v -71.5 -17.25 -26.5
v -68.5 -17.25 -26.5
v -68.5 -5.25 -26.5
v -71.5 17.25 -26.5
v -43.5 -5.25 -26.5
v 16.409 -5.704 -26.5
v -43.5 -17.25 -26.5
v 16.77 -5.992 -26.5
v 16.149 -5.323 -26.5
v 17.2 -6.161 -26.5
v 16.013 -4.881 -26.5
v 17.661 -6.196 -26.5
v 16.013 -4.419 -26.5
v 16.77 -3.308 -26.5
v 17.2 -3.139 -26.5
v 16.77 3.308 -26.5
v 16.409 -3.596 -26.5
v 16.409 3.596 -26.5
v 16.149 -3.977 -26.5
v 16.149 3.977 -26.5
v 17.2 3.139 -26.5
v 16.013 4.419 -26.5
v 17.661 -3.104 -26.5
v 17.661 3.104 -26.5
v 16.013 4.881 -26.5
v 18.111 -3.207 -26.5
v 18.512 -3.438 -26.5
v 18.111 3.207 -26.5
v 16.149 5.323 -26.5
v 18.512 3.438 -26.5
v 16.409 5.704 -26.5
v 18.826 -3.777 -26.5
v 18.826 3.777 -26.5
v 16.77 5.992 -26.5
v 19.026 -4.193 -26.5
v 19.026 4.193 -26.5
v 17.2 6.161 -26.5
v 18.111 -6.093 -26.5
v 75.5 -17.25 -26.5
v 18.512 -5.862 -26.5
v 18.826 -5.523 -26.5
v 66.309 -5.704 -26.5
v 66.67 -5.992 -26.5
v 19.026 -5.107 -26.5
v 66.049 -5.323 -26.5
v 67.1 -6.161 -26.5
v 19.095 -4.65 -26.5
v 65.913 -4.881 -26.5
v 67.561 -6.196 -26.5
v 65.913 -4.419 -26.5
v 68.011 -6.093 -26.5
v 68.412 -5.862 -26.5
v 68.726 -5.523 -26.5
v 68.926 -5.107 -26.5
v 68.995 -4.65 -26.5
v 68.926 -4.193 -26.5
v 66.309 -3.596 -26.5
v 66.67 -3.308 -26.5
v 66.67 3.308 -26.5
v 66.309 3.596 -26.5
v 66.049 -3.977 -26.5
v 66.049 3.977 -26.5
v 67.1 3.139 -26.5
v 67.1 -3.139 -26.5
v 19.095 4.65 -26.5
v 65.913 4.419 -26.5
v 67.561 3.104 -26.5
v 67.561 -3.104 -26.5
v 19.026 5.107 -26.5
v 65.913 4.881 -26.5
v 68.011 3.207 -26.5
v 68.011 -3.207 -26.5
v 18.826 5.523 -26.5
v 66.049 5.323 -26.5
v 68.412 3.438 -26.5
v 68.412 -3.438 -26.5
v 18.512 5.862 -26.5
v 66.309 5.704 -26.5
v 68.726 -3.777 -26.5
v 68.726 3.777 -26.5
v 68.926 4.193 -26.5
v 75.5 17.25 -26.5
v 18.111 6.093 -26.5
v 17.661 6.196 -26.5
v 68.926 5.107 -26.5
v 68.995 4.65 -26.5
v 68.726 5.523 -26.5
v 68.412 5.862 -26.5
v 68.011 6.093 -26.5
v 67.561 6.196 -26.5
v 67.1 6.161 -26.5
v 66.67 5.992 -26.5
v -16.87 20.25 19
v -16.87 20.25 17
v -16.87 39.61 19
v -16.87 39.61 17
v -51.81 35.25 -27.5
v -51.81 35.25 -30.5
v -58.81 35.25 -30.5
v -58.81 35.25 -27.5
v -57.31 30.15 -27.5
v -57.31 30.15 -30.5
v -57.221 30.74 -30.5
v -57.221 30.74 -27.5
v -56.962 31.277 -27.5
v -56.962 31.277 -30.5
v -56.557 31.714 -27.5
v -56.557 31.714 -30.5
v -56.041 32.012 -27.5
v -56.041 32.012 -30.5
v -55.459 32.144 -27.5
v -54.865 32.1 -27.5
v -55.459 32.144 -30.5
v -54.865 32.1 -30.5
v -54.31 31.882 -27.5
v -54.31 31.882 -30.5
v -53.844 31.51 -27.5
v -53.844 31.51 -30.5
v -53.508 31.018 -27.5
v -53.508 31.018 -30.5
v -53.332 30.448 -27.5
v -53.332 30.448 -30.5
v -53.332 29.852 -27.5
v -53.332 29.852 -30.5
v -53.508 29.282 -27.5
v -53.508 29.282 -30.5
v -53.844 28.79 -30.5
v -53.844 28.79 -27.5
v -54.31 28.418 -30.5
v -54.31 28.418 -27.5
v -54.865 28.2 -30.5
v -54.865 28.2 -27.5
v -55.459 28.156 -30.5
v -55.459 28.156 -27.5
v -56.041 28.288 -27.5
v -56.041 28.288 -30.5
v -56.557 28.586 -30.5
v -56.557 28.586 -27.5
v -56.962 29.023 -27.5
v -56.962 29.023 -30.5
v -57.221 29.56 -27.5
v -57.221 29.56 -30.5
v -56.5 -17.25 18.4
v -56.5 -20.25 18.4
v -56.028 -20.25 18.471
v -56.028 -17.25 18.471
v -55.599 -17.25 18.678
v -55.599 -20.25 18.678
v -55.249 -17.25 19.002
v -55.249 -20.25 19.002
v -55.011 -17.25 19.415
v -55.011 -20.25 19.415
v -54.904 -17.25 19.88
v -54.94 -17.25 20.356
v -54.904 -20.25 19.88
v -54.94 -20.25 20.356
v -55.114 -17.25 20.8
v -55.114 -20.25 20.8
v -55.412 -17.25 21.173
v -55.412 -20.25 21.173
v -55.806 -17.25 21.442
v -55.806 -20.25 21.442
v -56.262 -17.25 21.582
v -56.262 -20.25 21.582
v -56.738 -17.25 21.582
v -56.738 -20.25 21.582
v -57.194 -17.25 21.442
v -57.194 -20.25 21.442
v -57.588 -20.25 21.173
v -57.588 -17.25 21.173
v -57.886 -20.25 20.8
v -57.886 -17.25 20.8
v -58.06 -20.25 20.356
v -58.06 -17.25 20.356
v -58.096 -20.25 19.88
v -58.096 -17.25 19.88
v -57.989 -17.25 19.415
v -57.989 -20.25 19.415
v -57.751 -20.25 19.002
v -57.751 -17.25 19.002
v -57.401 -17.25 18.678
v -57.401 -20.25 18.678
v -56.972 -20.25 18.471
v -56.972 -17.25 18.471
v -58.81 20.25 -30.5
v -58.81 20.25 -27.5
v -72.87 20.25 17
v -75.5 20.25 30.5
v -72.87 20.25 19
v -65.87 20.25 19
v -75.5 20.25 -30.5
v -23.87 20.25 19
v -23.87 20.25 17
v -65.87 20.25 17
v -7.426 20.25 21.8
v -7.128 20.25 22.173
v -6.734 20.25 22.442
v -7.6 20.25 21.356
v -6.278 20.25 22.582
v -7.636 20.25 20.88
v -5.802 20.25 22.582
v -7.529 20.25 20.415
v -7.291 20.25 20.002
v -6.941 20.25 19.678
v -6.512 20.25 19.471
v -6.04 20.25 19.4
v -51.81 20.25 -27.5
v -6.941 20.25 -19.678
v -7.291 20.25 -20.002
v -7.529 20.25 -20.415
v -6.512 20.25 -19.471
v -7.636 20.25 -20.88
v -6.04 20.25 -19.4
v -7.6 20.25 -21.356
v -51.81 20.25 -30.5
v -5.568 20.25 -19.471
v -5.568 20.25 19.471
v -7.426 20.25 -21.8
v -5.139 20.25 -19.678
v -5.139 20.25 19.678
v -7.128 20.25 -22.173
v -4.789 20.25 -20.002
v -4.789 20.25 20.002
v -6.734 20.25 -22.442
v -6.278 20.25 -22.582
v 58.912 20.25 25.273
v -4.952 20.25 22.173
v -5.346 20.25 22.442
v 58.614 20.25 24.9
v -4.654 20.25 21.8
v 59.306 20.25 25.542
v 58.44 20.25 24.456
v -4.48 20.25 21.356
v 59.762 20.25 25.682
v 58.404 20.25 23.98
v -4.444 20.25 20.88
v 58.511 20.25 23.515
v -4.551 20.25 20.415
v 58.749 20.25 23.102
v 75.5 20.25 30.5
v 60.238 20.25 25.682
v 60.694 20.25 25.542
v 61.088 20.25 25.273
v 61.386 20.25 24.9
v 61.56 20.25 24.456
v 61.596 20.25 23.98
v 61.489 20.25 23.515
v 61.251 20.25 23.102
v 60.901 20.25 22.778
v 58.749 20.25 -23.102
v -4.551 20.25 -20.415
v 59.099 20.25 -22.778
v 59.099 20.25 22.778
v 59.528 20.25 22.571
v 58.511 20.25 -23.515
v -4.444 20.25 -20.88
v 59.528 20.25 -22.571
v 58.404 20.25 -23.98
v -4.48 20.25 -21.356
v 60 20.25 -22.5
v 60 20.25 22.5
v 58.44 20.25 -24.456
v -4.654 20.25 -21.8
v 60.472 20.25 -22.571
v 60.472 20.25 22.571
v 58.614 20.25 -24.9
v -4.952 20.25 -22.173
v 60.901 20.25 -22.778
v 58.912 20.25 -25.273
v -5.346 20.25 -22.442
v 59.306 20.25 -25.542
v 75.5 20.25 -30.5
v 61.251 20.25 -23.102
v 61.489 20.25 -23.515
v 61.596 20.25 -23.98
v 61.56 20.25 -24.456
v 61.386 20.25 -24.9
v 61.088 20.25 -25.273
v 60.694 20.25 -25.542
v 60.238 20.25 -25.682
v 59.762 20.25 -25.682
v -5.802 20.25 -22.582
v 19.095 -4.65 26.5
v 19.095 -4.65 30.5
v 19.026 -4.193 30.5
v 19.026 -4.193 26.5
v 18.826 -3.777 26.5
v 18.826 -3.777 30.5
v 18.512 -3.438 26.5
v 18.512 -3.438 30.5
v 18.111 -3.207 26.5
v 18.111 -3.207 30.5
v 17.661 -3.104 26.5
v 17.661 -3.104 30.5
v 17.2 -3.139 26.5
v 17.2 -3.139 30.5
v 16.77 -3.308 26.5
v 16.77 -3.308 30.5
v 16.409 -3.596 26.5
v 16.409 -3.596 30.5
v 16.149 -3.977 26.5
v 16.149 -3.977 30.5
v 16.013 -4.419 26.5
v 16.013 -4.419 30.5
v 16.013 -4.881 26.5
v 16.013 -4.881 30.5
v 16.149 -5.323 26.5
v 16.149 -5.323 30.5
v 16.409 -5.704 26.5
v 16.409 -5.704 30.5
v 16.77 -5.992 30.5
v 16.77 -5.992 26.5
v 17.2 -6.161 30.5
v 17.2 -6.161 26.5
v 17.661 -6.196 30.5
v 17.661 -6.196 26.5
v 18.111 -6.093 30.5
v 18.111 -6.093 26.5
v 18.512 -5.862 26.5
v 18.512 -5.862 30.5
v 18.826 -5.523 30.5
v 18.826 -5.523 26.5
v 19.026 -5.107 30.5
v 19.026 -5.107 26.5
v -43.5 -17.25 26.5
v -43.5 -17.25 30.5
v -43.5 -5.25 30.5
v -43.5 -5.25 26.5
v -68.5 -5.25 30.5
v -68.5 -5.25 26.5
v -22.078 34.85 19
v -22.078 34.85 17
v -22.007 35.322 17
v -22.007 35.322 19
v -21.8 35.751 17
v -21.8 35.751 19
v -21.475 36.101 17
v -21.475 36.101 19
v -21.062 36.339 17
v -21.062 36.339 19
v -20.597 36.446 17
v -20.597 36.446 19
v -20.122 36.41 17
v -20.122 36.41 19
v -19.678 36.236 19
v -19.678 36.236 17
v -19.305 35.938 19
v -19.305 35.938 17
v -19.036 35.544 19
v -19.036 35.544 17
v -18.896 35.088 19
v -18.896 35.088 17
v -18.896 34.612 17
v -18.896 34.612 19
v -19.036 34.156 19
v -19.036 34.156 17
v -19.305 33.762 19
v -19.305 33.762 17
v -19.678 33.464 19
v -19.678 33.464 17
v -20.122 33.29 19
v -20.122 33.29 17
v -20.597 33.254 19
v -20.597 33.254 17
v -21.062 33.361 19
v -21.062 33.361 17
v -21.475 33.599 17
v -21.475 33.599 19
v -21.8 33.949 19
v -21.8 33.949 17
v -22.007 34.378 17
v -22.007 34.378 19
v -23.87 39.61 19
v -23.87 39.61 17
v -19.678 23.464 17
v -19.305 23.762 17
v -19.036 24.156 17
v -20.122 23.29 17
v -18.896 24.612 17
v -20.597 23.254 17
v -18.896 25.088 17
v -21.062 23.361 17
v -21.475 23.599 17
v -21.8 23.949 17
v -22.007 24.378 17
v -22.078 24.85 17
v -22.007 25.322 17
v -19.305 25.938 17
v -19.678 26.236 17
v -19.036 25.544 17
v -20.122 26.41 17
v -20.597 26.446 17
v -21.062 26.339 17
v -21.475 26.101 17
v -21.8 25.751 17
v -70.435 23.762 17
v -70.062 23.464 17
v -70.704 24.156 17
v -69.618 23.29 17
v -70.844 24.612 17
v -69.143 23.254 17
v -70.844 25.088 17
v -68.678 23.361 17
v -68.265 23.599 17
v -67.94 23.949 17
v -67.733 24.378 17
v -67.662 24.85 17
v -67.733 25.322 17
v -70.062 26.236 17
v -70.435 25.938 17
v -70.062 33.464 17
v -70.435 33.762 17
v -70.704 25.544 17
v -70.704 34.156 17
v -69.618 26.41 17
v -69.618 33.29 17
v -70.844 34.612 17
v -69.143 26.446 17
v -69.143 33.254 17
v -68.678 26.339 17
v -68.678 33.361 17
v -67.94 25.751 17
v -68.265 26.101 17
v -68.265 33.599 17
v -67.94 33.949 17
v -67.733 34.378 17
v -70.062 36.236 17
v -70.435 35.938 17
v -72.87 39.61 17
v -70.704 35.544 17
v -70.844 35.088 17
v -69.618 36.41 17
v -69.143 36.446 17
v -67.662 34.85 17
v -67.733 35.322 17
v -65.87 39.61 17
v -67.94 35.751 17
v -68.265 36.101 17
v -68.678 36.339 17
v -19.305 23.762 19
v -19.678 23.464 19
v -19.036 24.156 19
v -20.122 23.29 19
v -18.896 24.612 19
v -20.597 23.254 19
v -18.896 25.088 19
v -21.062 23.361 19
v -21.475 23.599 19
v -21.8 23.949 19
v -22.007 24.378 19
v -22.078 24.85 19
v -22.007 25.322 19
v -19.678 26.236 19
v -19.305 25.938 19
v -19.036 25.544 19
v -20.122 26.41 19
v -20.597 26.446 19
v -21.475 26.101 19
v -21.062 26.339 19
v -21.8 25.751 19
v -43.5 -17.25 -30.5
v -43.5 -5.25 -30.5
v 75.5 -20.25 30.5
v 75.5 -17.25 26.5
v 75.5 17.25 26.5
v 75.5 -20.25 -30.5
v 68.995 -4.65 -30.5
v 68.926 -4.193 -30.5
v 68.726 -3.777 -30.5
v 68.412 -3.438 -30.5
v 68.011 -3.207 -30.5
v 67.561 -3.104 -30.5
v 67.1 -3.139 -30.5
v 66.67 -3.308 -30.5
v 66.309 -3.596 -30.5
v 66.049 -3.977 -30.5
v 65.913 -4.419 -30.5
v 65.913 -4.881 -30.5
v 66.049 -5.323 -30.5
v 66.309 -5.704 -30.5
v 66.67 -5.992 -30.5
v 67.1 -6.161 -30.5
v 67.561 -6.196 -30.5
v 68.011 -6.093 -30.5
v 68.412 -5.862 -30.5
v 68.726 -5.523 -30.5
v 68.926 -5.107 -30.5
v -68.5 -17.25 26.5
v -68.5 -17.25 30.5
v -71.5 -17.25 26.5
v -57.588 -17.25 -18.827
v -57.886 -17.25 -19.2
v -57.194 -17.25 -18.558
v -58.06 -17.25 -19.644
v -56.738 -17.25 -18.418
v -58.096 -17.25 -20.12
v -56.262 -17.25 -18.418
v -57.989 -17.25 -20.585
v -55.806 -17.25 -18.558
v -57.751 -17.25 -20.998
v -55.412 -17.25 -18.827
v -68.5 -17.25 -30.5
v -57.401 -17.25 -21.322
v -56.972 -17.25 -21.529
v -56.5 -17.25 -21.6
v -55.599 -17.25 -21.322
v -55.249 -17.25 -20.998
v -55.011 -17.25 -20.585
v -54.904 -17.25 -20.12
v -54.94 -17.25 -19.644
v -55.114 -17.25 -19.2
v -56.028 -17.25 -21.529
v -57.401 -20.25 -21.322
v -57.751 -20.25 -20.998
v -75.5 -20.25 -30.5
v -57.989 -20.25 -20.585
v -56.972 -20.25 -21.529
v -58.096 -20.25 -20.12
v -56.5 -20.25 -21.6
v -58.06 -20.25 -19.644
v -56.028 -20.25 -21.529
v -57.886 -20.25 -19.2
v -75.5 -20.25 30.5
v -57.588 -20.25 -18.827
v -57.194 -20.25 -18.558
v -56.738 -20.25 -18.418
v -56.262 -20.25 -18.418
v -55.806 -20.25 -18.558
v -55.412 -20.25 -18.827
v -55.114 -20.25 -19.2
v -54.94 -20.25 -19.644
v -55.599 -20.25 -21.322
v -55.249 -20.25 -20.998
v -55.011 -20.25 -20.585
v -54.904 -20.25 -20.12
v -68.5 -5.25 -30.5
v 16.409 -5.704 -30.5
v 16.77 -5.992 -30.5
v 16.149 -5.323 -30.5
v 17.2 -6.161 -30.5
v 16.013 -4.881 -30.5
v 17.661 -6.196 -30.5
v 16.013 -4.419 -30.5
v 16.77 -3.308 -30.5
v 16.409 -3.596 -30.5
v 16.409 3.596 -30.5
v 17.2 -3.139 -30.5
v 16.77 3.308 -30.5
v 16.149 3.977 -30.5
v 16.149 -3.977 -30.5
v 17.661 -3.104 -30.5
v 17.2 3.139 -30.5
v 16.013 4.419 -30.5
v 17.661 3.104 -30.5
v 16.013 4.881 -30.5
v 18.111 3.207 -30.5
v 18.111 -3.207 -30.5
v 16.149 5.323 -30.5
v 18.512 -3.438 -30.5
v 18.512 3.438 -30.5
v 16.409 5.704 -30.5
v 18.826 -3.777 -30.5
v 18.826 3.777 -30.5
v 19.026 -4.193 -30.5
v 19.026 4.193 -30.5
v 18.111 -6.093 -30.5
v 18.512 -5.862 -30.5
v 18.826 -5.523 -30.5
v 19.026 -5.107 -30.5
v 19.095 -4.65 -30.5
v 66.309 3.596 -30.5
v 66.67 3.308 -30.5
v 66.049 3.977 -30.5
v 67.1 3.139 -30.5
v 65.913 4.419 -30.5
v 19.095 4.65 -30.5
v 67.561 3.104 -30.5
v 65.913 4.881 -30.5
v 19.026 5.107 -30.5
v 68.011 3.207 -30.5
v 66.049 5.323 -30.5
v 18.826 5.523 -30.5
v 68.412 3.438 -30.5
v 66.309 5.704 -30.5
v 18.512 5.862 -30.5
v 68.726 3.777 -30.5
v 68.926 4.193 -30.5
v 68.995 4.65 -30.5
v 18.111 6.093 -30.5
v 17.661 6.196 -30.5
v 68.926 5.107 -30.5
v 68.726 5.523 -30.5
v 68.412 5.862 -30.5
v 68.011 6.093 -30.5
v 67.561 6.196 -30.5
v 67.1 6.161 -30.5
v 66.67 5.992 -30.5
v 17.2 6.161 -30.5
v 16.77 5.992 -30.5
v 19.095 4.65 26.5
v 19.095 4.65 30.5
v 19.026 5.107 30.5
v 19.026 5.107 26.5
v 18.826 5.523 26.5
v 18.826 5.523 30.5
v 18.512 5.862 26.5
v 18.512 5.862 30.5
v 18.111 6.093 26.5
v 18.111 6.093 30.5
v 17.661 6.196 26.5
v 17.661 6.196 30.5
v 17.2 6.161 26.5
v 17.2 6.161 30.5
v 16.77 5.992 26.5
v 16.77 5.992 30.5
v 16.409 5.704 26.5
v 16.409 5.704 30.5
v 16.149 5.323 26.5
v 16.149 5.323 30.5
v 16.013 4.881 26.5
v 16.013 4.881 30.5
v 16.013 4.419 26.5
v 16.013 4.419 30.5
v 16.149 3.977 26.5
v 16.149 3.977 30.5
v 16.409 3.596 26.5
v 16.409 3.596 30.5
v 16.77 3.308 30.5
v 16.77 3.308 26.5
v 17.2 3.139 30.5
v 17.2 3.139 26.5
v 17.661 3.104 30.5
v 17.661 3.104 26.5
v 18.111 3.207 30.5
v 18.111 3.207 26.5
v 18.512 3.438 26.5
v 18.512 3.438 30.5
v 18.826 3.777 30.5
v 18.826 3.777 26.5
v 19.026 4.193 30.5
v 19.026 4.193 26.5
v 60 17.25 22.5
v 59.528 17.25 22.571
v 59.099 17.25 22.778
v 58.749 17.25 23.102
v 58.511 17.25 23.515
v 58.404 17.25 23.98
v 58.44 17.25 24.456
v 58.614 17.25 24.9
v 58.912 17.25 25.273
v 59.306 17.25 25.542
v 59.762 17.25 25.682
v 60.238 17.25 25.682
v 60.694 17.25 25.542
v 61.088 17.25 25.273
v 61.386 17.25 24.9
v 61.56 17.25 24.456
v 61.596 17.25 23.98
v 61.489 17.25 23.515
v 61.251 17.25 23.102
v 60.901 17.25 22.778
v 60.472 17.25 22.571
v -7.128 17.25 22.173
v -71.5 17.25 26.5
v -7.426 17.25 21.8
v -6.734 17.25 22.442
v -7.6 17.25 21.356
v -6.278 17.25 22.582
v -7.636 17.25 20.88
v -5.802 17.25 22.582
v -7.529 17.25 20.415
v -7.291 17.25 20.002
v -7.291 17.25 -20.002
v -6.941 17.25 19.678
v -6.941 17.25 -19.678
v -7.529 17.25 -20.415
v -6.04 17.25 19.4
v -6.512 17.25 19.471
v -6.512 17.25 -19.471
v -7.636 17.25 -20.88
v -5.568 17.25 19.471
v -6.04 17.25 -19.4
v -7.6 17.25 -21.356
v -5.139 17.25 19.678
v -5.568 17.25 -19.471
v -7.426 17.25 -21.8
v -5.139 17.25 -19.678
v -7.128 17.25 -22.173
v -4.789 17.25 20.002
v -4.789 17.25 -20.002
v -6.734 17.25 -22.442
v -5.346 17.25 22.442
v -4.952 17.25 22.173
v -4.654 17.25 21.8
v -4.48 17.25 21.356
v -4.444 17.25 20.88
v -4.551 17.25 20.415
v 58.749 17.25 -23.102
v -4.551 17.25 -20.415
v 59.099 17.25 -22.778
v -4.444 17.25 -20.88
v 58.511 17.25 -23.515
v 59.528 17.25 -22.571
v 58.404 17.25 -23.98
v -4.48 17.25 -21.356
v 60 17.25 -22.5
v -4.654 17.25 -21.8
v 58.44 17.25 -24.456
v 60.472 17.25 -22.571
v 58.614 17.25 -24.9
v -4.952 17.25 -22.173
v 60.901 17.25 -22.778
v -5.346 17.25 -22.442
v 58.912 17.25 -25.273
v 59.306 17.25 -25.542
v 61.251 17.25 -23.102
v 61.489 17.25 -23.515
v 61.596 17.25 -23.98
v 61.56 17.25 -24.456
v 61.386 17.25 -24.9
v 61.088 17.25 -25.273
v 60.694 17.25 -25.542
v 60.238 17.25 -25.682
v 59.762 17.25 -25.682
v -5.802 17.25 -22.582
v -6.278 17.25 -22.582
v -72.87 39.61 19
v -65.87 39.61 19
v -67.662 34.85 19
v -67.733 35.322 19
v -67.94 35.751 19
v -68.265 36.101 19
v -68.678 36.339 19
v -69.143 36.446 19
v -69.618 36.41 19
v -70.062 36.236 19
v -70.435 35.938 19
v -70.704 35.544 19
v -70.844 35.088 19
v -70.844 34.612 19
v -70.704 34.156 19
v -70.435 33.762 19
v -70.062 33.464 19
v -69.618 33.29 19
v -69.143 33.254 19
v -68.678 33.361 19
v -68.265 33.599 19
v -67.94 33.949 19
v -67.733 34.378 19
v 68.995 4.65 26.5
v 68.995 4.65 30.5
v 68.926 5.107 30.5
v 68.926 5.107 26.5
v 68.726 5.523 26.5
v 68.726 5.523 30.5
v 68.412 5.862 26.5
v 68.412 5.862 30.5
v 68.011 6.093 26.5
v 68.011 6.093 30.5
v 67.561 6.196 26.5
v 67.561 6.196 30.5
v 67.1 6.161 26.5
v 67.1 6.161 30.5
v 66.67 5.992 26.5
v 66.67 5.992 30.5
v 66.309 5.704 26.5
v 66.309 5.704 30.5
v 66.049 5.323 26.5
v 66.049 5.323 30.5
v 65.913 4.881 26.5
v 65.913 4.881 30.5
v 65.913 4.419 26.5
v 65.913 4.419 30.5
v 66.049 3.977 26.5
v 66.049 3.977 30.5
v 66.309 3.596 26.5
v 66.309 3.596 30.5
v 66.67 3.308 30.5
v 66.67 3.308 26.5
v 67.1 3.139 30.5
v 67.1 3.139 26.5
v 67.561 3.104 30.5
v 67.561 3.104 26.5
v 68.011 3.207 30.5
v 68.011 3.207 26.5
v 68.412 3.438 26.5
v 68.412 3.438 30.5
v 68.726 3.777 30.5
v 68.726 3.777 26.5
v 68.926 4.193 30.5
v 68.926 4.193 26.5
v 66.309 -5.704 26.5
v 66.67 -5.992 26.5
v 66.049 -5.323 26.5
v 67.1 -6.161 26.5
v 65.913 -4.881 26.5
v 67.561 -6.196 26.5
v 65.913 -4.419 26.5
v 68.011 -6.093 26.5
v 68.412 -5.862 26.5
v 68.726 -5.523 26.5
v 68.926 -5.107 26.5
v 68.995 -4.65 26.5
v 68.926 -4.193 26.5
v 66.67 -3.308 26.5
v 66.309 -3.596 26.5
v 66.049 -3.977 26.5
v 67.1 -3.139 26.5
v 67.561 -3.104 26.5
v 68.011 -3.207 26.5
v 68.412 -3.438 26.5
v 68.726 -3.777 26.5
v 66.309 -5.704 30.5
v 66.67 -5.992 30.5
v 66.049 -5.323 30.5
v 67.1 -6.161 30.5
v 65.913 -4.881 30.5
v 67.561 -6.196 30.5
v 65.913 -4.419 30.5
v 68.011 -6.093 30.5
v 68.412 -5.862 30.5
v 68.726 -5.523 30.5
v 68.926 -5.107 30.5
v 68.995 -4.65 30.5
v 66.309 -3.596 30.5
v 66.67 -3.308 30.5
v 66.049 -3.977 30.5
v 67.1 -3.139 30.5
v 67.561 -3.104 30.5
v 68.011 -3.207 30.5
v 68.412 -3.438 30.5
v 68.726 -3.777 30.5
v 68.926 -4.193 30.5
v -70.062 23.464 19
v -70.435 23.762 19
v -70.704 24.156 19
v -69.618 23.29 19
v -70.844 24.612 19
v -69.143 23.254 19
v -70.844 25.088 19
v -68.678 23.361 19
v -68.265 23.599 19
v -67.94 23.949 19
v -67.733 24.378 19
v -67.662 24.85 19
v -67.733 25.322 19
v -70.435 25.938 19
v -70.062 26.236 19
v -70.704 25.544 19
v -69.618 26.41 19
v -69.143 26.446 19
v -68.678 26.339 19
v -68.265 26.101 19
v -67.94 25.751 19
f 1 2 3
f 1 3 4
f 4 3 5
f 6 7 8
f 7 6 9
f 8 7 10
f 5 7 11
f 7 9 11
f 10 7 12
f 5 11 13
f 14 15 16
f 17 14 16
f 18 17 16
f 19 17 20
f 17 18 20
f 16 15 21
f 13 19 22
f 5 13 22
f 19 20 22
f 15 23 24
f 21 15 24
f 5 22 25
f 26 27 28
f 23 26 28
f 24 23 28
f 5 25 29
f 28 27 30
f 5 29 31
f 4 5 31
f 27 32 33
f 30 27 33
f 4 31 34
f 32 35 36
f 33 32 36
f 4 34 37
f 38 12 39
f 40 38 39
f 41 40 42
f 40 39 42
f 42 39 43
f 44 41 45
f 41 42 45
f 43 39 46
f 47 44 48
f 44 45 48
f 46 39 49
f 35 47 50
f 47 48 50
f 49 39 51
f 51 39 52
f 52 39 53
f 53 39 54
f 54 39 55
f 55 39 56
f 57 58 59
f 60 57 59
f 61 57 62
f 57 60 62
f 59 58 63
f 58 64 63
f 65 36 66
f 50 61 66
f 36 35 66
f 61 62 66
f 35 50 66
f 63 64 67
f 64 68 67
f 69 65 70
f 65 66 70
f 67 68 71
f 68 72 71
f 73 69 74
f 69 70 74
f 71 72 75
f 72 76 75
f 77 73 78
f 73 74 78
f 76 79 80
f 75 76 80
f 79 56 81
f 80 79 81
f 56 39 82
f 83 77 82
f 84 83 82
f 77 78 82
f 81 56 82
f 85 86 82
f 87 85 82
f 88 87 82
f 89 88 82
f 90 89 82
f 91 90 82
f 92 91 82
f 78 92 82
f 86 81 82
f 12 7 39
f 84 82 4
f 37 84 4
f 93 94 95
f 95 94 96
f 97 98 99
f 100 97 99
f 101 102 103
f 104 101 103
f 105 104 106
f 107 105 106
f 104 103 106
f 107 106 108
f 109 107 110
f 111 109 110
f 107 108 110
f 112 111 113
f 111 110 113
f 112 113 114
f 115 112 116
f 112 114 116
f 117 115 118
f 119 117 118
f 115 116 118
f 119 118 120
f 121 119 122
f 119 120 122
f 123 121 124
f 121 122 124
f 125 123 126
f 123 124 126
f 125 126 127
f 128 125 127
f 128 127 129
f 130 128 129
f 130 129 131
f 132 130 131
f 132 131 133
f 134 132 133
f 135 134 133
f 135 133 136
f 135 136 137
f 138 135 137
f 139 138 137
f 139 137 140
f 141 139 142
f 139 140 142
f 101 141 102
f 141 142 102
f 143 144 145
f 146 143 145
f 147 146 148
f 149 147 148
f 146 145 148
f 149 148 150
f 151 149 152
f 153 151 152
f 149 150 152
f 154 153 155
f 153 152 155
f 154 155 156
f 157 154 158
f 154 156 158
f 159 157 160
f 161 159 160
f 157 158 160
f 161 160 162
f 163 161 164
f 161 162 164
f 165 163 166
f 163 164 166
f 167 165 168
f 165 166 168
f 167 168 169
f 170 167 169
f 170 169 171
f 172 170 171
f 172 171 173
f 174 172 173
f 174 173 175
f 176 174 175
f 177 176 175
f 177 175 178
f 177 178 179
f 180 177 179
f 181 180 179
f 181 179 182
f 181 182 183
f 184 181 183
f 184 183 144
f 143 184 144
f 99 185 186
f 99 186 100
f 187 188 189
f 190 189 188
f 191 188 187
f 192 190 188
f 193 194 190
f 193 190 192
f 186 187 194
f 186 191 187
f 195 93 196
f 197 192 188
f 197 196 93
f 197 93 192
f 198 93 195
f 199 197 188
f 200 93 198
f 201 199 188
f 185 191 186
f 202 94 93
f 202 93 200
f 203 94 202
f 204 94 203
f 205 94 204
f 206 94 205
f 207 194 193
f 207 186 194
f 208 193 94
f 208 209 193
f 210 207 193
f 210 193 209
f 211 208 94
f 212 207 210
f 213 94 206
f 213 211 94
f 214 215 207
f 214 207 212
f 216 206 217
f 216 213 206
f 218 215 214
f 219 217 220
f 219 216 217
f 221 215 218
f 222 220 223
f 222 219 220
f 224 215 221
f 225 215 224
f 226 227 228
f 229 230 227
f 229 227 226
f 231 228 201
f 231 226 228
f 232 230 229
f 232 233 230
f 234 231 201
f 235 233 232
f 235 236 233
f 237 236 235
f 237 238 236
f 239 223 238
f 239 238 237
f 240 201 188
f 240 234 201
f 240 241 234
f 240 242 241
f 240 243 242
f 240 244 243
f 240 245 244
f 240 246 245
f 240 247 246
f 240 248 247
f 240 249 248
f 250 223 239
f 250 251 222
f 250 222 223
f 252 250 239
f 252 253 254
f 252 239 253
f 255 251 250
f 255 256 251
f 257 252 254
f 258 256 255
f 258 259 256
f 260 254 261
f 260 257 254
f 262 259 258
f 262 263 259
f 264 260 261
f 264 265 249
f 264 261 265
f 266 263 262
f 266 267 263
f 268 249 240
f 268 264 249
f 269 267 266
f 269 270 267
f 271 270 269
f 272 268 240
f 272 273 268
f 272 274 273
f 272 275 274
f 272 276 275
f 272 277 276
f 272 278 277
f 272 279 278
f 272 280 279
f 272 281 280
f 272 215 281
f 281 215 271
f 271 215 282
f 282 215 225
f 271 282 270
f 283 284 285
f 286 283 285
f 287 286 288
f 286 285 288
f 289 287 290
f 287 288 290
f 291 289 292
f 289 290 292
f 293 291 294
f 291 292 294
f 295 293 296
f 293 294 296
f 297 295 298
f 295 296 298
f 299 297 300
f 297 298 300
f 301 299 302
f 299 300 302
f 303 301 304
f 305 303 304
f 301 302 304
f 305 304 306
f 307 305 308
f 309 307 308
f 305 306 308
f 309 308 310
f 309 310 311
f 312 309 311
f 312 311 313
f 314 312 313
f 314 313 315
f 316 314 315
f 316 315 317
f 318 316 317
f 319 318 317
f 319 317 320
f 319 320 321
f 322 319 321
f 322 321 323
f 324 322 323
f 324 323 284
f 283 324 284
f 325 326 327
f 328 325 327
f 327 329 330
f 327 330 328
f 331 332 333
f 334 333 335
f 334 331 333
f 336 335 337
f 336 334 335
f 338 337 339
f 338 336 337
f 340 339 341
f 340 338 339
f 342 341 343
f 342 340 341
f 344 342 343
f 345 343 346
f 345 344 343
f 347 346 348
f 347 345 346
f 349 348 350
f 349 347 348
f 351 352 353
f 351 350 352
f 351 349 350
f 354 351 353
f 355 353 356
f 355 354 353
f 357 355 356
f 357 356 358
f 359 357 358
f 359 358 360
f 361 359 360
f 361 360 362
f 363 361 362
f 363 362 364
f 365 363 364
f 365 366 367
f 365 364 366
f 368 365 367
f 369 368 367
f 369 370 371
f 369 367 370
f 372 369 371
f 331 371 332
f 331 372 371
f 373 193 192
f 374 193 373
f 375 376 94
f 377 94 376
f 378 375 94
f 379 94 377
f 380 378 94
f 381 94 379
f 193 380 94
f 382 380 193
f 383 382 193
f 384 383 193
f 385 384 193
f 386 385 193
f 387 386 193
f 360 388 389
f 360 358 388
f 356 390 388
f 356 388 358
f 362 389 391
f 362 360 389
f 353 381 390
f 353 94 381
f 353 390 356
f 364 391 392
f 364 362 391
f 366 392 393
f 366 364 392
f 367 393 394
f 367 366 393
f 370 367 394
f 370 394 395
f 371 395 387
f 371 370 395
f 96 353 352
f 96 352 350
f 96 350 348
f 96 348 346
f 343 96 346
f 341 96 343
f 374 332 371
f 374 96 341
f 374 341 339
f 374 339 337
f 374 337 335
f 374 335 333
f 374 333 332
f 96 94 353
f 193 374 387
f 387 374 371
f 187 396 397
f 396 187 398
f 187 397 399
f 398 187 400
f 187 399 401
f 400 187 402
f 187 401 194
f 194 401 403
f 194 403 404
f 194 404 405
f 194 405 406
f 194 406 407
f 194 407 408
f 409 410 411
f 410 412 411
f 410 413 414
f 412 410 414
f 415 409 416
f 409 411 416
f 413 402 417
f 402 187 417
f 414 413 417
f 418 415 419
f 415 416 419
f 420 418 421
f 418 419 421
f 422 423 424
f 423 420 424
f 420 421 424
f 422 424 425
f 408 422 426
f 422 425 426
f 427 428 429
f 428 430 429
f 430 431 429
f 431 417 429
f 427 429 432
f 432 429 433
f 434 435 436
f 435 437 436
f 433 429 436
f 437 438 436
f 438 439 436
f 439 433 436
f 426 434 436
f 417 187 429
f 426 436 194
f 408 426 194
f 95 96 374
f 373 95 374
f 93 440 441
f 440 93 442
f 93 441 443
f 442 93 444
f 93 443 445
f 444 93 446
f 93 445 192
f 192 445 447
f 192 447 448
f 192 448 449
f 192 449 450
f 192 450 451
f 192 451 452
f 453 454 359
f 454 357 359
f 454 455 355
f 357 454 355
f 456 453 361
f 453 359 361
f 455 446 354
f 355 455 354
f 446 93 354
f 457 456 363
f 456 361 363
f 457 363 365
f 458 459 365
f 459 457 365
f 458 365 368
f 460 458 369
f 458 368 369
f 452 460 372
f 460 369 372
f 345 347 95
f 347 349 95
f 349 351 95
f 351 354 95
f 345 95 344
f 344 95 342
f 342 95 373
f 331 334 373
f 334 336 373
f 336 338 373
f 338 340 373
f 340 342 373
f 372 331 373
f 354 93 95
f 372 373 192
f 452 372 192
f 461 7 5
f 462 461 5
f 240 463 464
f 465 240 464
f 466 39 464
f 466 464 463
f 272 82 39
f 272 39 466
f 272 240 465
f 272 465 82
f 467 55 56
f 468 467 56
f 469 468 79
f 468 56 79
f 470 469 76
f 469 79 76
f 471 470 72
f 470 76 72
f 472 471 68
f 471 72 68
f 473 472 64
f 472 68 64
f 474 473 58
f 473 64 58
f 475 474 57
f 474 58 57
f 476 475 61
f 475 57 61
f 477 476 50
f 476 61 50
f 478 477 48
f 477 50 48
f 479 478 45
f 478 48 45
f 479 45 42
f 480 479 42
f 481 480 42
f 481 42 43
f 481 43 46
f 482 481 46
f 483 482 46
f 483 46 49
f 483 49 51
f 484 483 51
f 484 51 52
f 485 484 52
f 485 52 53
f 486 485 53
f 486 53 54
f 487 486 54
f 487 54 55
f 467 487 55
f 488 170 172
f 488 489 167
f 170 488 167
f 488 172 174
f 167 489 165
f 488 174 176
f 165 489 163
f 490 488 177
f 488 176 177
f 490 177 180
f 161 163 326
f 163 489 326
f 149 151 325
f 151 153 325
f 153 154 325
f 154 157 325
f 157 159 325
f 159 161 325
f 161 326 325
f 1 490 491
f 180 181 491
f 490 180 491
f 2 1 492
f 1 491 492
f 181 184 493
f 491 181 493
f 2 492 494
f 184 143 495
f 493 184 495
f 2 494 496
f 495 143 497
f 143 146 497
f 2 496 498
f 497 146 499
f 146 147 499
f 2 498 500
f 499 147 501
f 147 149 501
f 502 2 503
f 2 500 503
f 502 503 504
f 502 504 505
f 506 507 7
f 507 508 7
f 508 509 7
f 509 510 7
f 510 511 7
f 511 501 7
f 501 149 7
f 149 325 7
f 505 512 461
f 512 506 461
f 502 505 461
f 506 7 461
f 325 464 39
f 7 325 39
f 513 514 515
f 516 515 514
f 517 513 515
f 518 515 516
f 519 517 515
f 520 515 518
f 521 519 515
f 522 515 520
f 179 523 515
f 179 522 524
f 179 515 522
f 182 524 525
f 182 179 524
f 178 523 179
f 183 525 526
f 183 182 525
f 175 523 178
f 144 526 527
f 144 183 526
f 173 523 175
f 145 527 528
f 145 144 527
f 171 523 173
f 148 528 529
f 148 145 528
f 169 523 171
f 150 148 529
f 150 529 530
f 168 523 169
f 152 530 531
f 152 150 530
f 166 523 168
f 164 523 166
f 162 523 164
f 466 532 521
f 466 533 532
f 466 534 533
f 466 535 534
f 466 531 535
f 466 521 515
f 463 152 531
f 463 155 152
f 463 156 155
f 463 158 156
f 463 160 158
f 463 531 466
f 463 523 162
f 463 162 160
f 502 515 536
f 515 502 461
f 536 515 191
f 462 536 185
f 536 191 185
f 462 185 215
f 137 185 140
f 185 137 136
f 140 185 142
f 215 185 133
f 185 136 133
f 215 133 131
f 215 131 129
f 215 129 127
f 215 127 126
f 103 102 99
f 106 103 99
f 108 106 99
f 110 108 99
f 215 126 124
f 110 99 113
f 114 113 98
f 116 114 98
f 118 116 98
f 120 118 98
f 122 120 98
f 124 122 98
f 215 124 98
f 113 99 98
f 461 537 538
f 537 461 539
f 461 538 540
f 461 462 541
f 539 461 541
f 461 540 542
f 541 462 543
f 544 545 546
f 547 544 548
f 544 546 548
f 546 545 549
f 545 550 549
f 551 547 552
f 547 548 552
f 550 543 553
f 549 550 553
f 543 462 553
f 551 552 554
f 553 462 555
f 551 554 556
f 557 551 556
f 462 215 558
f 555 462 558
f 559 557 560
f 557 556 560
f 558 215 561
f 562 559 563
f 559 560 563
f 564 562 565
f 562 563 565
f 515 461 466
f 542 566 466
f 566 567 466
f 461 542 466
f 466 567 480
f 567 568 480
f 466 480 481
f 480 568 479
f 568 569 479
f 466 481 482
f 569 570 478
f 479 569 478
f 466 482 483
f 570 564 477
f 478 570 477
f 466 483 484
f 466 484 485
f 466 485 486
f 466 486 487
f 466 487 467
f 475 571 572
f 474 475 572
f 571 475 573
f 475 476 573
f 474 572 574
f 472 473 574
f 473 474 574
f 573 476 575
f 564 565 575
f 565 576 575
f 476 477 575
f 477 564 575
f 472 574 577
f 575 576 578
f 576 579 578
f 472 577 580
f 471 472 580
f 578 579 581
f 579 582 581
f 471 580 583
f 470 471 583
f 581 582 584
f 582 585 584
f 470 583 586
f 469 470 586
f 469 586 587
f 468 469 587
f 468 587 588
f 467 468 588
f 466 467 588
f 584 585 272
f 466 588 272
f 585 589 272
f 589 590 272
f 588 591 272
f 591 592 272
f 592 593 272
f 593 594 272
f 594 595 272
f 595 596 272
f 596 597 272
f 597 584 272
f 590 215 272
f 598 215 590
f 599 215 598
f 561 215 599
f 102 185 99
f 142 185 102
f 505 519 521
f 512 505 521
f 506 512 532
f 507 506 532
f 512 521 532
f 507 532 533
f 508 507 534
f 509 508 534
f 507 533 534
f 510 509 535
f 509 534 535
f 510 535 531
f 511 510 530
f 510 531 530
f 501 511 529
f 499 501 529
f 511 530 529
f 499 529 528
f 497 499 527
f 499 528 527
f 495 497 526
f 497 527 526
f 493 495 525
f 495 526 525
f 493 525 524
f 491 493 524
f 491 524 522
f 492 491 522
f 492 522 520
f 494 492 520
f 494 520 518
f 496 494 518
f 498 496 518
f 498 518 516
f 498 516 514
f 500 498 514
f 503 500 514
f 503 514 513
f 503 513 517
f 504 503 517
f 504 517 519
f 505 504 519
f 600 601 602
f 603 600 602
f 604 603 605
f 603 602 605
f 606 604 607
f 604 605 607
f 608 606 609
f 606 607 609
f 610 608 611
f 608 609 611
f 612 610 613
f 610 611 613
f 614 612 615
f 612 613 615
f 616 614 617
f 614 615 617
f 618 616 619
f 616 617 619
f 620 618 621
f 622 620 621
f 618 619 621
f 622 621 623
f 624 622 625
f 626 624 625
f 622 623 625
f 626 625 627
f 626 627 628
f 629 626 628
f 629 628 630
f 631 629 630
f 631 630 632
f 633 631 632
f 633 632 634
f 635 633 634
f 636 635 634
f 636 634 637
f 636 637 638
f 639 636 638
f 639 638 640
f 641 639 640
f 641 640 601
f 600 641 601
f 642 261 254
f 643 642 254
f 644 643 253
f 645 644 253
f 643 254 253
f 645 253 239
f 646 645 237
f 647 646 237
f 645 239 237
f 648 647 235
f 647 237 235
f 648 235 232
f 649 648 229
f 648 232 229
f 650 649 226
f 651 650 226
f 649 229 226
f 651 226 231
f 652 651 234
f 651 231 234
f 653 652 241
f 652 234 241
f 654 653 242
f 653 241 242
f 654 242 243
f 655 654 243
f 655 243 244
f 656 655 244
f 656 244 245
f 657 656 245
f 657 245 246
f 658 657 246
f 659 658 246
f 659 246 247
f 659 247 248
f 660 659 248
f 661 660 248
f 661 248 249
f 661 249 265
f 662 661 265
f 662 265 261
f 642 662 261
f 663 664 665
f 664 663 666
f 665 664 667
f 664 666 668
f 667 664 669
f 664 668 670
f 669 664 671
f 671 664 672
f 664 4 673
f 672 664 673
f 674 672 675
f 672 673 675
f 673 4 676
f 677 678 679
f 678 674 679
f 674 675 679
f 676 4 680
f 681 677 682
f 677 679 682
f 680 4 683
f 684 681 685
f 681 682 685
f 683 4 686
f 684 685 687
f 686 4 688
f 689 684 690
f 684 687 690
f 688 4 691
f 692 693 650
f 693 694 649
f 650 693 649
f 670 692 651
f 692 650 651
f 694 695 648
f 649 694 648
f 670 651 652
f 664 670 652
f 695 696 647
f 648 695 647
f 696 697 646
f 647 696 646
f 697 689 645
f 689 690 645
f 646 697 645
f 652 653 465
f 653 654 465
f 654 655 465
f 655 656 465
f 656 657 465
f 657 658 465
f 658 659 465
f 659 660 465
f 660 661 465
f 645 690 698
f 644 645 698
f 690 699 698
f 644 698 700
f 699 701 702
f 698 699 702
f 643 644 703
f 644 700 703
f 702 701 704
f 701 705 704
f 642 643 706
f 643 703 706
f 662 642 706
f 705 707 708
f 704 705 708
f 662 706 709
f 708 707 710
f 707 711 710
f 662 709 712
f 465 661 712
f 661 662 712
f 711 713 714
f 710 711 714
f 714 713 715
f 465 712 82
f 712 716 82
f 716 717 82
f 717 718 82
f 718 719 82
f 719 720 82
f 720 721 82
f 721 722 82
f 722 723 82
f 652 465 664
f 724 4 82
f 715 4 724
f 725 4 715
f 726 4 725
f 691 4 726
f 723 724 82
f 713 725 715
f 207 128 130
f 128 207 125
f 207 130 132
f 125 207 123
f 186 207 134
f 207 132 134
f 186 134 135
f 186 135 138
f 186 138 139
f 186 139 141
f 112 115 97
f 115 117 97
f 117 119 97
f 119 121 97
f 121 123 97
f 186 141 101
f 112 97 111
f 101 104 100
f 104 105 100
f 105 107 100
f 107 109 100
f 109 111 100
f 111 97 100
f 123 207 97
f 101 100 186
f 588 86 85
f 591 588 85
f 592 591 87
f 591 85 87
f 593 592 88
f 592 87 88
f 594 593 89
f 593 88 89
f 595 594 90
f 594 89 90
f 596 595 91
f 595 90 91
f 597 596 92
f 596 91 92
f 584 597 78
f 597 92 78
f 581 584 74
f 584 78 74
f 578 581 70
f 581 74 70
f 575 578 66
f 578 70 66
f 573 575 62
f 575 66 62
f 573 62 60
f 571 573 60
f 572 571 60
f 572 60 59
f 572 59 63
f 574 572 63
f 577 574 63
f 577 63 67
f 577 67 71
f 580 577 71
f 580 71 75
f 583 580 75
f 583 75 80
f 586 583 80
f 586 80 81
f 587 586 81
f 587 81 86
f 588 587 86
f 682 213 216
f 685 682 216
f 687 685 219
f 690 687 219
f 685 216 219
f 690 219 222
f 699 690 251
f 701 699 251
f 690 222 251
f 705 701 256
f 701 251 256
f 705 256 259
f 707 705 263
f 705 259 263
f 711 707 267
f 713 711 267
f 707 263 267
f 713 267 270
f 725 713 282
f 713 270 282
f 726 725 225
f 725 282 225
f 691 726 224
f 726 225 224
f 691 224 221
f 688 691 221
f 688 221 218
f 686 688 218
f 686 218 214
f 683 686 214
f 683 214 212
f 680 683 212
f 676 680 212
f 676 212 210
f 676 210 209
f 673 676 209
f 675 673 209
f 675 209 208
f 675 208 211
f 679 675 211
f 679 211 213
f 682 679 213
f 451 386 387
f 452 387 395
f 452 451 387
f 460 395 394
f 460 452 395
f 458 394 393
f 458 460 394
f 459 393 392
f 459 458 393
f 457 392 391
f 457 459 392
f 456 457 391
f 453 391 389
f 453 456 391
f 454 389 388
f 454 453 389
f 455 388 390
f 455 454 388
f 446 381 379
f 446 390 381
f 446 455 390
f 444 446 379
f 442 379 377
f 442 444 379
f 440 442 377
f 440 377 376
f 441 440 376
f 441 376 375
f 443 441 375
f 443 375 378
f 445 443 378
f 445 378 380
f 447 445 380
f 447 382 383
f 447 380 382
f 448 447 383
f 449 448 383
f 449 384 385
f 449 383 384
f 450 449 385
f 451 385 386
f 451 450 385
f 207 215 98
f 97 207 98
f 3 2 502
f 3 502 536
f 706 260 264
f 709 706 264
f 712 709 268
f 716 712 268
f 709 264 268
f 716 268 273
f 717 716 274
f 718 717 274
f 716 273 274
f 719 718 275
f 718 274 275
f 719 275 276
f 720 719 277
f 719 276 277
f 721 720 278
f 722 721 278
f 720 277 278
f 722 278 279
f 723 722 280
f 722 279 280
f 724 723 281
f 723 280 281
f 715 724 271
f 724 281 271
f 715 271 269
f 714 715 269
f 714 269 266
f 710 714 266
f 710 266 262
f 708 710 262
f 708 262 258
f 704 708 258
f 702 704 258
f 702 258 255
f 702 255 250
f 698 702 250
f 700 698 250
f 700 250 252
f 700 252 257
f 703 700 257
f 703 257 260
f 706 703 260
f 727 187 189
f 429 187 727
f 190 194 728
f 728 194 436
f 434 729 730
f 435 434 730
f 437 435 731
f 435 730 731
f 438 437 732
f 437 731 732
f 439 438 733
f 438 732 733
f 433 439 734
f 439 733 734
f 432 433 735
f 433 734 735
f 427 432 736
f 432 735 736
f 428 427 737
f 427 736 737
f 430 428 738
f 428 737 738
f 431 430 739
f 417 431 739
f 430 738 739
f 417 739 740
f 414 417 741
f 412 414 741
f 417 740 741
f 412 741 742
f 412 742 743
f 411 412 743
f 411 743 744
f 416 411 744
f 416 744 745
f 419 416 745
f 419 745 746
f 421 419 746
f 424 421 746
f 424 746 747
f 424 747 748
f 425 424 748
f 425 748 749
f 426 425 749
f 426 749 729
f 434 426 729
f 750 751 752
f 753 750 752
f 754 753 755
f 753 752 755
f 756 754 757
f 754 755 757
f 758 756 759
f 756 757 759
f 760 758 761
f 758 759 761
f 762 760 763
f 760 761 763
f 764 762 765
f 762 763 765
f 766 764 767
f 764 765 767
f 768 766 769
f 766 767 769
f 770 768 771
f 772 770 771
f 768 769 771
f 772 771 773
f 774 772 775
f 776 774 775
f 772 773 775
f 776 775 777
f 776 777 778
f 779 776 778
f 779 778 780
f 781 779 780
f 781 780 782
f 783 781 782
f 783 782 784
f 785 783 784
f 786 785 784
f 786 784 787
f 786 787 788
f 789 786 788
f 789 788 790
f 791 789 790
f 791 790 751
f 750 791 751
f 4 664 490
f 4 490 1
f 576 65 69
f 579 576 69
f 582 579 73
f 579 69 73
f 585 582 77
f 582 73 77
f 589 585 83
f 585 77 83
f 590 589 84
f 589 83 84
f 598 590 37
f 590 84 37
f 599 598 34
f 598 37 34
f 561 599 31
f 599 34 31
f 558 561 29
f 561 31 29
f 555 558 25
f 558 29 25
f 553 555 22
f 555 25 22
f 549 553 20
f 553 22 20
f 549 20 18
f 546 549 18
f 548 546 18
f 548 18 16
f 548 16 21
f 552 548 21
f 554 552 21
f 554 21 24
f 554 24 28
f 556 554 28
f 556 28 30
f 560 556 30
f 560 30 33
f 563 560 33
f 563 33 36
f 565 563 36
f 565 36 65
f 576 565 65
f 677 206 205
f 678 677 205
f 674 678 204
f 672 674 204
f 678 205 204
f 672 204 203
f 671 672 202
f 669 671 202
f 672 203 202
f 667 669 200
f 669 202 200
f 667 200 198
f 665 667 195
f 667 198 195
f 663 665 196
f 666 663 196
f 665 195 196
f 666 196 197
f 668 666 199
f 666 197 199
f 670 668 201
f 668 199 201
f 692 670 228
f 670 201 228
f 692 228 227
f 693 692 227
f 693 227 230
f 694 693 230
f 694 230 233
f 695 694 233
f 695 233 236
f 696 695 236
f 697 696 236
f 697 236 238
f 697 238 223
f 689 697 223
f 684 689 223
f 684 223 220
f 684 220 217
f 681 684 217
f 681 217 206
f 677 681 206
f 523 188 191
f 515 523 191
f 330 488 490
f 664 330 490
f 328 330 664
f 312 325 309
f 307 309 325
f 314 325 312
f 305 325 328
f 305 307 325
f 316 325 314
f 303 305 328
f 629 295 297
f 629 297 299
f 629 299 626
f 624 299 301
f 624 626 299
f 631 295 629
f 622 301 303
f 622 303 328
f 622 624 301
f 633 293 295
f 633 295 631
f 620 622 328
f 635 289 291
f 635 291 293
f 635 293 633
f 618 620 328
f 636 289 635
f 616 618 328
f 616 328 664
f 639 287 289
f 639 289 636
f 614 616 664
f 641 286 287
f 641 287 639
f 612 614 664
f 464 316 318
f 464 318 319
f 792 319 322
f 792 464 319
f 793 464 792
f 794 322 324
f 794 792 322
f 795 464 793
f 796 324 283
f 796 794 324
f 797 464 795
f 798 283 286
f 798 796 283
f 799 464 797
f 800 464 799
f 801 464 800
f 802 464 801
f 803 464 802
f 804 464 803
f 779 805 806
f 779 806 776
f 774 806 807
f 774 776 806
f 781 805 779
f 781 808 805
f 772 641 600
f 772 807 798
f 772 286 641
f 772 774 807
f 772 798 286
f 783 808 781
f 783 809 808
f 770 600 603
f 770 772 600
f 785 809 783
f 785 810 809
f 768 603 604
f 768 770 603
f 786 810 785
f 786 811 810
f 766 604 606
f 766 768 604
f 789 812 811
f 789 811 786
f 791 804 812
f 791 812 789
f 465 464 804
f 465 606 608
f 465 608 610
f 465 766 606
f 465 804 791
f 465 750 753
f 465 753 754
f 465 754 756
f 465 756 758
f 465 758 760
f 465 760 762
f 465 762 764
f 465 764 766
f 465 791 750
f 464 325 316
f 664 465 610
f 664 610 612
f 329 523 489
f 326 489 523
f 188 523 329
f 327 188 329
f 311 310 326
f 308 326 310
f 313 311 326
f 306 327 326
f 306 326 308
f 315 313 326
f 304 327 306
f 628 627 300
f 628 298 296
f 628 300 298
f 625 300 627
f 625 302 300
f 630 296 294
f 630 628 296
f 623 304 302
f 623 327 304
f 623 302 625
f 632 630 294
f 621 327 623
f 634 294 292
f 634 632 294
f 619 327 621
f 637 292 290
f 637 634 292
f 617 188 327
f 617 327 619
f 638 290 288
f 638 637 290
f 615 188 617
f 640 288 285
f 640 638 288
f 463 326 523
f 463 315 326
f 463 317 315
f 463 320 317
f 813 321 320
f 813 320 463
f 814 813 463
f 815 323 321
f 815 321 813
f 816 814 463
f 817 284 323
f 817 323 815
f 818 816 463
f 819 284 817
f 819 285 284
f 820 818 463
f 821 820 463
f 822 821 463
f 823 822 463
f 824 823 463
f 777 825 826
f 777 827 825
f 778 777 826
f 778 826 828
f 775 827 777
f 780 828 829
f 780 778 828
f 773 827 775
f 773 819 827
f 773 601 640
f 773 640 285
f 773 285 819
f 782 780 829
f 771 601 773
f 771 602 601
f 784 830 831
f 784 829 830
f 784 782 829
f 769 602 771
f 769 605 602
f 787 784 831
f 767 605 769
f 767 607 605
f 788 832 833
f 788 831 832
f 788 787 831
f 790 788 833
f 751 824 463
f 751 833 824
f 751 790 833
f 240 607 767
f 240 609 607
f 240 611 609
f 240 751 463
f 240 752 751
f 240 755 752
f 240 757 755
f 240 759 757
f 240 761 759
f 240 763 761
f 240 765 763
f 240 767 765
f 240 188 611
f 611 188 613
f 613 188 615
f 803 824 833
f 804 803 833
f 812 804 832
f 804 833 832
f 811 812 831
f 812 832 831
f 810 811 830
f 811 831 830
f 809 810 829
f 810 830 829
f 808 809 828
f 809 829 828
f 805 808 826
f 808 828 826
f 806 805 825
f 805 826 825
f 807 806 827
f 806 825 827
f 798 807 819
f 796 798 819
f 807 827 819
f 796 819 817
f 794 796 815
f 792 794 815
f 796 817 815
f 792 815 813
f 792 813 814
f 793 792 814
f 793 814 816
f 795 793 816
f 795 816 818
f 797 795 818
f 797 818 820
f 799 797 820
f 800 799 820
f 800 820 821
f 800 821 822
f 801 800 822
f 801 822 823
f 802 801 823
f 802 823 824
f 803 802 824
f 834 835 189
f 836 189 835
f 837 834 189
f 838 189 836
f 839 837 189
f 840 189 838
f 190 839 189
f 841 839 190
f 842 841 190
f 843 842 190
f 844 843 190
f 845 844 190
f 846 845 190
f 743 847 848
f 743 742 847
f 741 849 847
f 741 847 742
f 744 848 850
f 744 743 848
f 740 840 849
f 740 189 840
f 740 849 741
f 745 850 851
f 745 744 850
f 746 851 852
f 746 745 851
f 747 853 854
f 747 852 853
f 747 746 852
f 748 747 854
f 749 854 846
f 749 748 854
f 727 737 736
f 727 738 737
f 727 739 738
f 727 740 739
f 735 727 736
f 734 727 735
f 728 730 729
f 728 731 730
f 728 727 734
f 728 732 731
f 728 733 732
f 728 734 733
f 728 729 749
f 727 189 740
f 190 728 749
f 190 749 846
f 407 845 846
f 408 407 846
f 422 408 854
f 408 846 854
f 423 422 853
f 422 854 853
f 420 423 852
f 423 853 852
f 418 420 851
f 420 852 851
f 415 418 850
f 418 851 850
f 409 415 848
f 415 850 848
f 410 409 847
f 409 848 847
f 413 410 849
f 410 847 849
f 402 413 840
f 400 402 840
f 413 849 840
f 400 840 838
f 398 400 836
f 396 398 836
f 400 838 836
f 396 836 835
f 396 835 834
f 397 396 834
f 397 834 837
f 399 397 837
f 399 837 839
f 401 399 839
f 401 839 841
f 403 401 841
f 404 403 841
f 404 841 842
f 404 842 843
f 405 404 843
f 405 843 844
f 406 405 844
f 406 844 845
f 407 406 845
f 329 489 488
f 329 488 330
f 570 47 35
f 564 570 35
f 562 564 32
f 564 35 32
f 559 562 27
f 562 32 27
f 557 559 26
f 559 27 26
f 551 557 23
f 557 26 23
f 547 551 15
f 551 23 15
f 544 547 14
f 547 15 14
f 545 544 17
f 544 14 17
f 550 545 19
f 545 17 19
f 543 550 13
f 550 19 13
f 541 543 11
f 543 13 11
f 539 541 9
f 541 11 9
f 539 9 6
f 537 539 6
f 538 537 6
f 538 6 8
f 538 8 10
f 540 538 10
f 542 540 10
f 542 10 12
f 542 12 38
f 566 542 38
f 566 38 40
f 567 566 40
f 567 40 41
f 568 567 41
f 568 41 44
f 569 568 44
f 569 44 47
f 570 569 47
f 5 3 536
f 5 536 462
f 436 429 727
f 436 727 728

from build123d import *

# Parameters (mm, degrees)
SKETCH1_W           = 151
SKETCH1_H           = 61
SKETCH1_W_2         = 143
SKETCH1_H_2         = 53
BOSS_EXTRUDE1_DEPTH = 20.25
SKETCH2_W           = 143
SKETCH2_H           = 53
BOSS_EXTRUDE2_DEPTH = 3
SKETCH7_W           = 53
SKETCH7_H           = 37.5
CUT_EXTRUDE3_DEPTH  = 4
SKETCH9_W           = 147
SKETCH9_H           = 53
BOSS_EXTRUDE3_DEPTH = 3
CUT_EXTRUDE4_REACH  = 92.944
SKETCH10_R          = 1.6
SKETCH12_R          = 1.55
CUT_EXTRUDE6_DEPTH  = 100.152975245
SKETCH13_W          = 7
SKETCH13_H          = 19.36
BOSS_EXTRUDE4_DEPTH = 2
SKETCH16_R          = 1.6
CUT_EXTRUDE7_DEPTH  = 10
SKETCH17_W          = 7
SKETCH17_H          = 15
SKETCH17_R          = 2
BOSS_EXTRUDE5_DEPTH = 3
SKETCH18_R          = 1.6
CUT_EXTRUDE8_DEPTH  = 10
SKETCH19_W          = 25
SKETCH19_H          = 12
CUT_EXTRUDE9_DEPTH  = 105.834164756


with BuildPart() as part:
    # Sketch1 → Boss-Extrude1 (new, symmetric)
    with BuildSketch(Plane(origin=(0, 0, 0), x_dir=(1, 0, 0), z_dir=(0, 1, 0))):
        Rectangle(SKETCH1_W, SKETCH1_H)
        Rectangle(SKETCH1_W_2, SKETCH1_H_2, mode=Mode.SUBTRACT)
    extrude(amount=BOSS_EXTRUDE1_DEPTH, both=True)

    # Sketch2 → Boss-Extrude2 (add)
    with BuildSketch(Plane.XZ.offset(20.25)):
        Rectangle(SKETCH2_W, SKETCH2_H)
    extrude(amount=-BOSS_EXTRUDE2_DEPTH)

    # Sketch7 → Cut-Extrude3 (cut)
    with BuildSketch(Plane(origin=(75.5, 0, 0), x_dir=(0, 0, -1), z_dir=(1, 0, 0))):
        with Locations((0, 1.5)):
            Rectangle(SKETCH7_W, SKETCH7_H)
    extrude(amount=-CUT_EXTRUDE3_DEPTH, mode=Mode.SUBTRACT)

    # Sketch9 → Boss-Extrude3 (add)
    with BuildSketch(Plane(origin=(0, 20.25, 0), x_dir=(1, 0, 0), z_dir=(0, 1, 0))):
        with Locations((2, 0)):
            Rectangle(SKETCH9_W, SKETCH9_H)
    extrude(amount=-BOSS_EXTRUDE3_DEPTH)

    # Sketch10 → Cut-Extrude4 (cut, up to next)
    with BuildSketch(Plane(origin=(0, 20.25, 0), x_dir=(1, 0, 0), z_dir=(0, 1, 0)), mode=Mode.PRIVATE) as cut_extrude4_sk1:
        with Locations(Location((60, 24.1, 0), (0, 0, 270))):
            Circle(SKETCH10_R)
    cut_extrude4_tool1 = extrude(cut_extrude4_sk1.sketch, amount=-CUT_EXTRUDE4_REACH, mode=Mode.PRIVATE) & part.part
    # Sketch10 → Cut-Extrude4 (cut, up to next)
    with BuildSketch(Plane(origin=(0, 20.25, 0), x_dir=(1, 0, 0), z_dir=(0, 1, 0)), mode=Mode.PRIVATE) as cut_extrude4_sk2:
        with Locations(Location((60, -24.1, 0), (0, 0, 90))):
            Circle(SKETCH10_R)
    cut_extrude4_tool2 = extrude(cut_extrude4_sk2.sketch, amount=-CUT_EXTRUDE4_REACH, mode=Mode.PRIVATE) & part.part
    # Sketch10 → Cut-Extrude4 (cut, up to next)
    with BuildSketch(Plane(origin=(0, 20.25, 0), x_dir=(1, 0, 0), z_dir=(0, 1, 0)), mode=Mode.PRIVATE) as cut_extrude4_sk3:
        with Locations(Location((-6.04, 21, 0), (0, 0, 270))):
            Circle(SKETCH10_R)
    cut_extrude4_tool3 = extrude(cut_extrude4_sk3.sketch, amount=-CUT_EXTRUDE4_REACH, mode=Mode.PRIVATE) & part.part
    # Sketch10 → Cut-Extrude4 (cut, up to next)
    with BuildSketch(Plane(origin=(0, 20.25, 0), x_dir=(1, 0, 0), z_dir=(0, 1, 0)), mode=Mode.PRIVATE) as cut_extrude4_sk4:
        with Locations(Location((-6.04, -21, 0), (0, 0, 90))):
            Circle(SKETCH10_R)
    cut_extrude4_tool4 = extrude(cut_extrude4_sk4.sketch, amount=-CUT_EXTRUDE4_REACH, mode=Mode.PRIVATE) & part.part
    add(cut_extrude4_tool1.solids().sort_by_distance((60, 20.25, -24.1))[0], mode=Mode.SUBTRACT)
    add(cut_extrude4_tool2.solids().sort_by_distance((60, 20.25, 24.1))[0], mode=Mode.SUBTRACT)
    add(cut_extrude4_tool3.solids().sort_by_distance((-6.04, 20.25, -21))[0], mode=Mode.SUBTRACT)
    add(cut_extrude4_tool4.solids().sort_by_distance((-6.04, 20.25, 21))[0], mode=Mode.SUBTRACT)

    # Sketch12 → Cut-Extrude6 (cut, through all)
    with BuildSketch(Plane.XY.offset(30.5)):
        with Locations((67.445205237, 4.65)):
            Circle(SKETCH12_R)
        with Locations((67.445205237, -4.65)):
            Circle(SKETCH12_R)
        with Locations((17.545205237, 4.65)):
            Circle(SKETCH12_R)
        with Locations((17.545205237, -4.65)):
            Circle(SKETCH12_R)
    extrude(amount=-CUT_EXTRUDE6_DEPTH, mode=Mode.SUBTRACT)

    # Sketch13 → Boss-Extrude4 (add)
    with BuildSketch(Plane.XY.offset(17)):
        with Locations((-69.37, 29.93)):
            Rectangle(SKETCH13_W, SKETCH13_H)
    boss_extrude4 = extrude(amount=BOSS_EXTRUDE4_DEPTH)

    # Sketch16 → Cut-Extrude7 (cut)
    with BuildSketch(Plane.XY.offset(19)):
        with Locations((-69.262241782, 24.85)):
            Circle(SKETCH16_R)
        with Locations((-69.262241782, 34.85)):
            Circle(SKETCH16_R)
    cut_extrude7 = extrude(amount=-CUT_EXTRUDE7_DEPTH, mode=Mode.SUBTRACT)

    # Mirror1: Boss-Extrude4, Cut-Extrude7 across plane
    add(boss_extrude4.mirror(Plane(origin=(-44.87, 0, 0), x_dir=(0, 0, 1), z_dir=(1, 0, 0))))
    add(cut_extrude7.mirror(Plane(origin=(-44.87, 0, 0), x_dir=(0, 0, 1), z_dir=(1, 0, 0))), mode=Mode.SUBTRACT)

    # Sketch17 → Boss-Extrude5 (add)
    with BuildSketch(Plane(origin=(0, 0, -30.5), x_dir=(-1, 0, 0), z_dir=(0, 0, -1))):
        with Locations((55.31, 27.75)):
            Rectangle(SKETCH17_W, SKETCH17_H)
        with Locations((55.31, 30.15)):
            Circle(SKETCH17_R, mode=Mode.SUBTRACT)
    extrude(amount=-BOSS_EXTRUDE5_DEPTH)

    # Sketch18 → Cut-Extrude8 (cut)
    with BuildSketch(Plane.XZ.offset(20.25)):
        with Locations(Location((-56.5, 20, 0), (0, 0, 270))):
            Circle(SKETCH18_R)
        with Locations(Location((-56.5, -20, 0), (0, 0, 270))):
            Circle(SKETCH18_R)
    extrude(amount=-CUT_EXTRUDE8_DEPTH, mode=Mode.SUBTRACT)

    # Sketch19 → Cut-Extrude9 (cut, through all)
    with BuildSketch(Plane.XY.offset(30.5)):
        with Locations((-56, -11.25)):
            Rectangle(SKETCH19_W, SKETCH19_H)
    extrude(amount=-CUT_EXTRUDE9_DEPTH, mode=Mode.SUBTRACT)


solid = part.part
